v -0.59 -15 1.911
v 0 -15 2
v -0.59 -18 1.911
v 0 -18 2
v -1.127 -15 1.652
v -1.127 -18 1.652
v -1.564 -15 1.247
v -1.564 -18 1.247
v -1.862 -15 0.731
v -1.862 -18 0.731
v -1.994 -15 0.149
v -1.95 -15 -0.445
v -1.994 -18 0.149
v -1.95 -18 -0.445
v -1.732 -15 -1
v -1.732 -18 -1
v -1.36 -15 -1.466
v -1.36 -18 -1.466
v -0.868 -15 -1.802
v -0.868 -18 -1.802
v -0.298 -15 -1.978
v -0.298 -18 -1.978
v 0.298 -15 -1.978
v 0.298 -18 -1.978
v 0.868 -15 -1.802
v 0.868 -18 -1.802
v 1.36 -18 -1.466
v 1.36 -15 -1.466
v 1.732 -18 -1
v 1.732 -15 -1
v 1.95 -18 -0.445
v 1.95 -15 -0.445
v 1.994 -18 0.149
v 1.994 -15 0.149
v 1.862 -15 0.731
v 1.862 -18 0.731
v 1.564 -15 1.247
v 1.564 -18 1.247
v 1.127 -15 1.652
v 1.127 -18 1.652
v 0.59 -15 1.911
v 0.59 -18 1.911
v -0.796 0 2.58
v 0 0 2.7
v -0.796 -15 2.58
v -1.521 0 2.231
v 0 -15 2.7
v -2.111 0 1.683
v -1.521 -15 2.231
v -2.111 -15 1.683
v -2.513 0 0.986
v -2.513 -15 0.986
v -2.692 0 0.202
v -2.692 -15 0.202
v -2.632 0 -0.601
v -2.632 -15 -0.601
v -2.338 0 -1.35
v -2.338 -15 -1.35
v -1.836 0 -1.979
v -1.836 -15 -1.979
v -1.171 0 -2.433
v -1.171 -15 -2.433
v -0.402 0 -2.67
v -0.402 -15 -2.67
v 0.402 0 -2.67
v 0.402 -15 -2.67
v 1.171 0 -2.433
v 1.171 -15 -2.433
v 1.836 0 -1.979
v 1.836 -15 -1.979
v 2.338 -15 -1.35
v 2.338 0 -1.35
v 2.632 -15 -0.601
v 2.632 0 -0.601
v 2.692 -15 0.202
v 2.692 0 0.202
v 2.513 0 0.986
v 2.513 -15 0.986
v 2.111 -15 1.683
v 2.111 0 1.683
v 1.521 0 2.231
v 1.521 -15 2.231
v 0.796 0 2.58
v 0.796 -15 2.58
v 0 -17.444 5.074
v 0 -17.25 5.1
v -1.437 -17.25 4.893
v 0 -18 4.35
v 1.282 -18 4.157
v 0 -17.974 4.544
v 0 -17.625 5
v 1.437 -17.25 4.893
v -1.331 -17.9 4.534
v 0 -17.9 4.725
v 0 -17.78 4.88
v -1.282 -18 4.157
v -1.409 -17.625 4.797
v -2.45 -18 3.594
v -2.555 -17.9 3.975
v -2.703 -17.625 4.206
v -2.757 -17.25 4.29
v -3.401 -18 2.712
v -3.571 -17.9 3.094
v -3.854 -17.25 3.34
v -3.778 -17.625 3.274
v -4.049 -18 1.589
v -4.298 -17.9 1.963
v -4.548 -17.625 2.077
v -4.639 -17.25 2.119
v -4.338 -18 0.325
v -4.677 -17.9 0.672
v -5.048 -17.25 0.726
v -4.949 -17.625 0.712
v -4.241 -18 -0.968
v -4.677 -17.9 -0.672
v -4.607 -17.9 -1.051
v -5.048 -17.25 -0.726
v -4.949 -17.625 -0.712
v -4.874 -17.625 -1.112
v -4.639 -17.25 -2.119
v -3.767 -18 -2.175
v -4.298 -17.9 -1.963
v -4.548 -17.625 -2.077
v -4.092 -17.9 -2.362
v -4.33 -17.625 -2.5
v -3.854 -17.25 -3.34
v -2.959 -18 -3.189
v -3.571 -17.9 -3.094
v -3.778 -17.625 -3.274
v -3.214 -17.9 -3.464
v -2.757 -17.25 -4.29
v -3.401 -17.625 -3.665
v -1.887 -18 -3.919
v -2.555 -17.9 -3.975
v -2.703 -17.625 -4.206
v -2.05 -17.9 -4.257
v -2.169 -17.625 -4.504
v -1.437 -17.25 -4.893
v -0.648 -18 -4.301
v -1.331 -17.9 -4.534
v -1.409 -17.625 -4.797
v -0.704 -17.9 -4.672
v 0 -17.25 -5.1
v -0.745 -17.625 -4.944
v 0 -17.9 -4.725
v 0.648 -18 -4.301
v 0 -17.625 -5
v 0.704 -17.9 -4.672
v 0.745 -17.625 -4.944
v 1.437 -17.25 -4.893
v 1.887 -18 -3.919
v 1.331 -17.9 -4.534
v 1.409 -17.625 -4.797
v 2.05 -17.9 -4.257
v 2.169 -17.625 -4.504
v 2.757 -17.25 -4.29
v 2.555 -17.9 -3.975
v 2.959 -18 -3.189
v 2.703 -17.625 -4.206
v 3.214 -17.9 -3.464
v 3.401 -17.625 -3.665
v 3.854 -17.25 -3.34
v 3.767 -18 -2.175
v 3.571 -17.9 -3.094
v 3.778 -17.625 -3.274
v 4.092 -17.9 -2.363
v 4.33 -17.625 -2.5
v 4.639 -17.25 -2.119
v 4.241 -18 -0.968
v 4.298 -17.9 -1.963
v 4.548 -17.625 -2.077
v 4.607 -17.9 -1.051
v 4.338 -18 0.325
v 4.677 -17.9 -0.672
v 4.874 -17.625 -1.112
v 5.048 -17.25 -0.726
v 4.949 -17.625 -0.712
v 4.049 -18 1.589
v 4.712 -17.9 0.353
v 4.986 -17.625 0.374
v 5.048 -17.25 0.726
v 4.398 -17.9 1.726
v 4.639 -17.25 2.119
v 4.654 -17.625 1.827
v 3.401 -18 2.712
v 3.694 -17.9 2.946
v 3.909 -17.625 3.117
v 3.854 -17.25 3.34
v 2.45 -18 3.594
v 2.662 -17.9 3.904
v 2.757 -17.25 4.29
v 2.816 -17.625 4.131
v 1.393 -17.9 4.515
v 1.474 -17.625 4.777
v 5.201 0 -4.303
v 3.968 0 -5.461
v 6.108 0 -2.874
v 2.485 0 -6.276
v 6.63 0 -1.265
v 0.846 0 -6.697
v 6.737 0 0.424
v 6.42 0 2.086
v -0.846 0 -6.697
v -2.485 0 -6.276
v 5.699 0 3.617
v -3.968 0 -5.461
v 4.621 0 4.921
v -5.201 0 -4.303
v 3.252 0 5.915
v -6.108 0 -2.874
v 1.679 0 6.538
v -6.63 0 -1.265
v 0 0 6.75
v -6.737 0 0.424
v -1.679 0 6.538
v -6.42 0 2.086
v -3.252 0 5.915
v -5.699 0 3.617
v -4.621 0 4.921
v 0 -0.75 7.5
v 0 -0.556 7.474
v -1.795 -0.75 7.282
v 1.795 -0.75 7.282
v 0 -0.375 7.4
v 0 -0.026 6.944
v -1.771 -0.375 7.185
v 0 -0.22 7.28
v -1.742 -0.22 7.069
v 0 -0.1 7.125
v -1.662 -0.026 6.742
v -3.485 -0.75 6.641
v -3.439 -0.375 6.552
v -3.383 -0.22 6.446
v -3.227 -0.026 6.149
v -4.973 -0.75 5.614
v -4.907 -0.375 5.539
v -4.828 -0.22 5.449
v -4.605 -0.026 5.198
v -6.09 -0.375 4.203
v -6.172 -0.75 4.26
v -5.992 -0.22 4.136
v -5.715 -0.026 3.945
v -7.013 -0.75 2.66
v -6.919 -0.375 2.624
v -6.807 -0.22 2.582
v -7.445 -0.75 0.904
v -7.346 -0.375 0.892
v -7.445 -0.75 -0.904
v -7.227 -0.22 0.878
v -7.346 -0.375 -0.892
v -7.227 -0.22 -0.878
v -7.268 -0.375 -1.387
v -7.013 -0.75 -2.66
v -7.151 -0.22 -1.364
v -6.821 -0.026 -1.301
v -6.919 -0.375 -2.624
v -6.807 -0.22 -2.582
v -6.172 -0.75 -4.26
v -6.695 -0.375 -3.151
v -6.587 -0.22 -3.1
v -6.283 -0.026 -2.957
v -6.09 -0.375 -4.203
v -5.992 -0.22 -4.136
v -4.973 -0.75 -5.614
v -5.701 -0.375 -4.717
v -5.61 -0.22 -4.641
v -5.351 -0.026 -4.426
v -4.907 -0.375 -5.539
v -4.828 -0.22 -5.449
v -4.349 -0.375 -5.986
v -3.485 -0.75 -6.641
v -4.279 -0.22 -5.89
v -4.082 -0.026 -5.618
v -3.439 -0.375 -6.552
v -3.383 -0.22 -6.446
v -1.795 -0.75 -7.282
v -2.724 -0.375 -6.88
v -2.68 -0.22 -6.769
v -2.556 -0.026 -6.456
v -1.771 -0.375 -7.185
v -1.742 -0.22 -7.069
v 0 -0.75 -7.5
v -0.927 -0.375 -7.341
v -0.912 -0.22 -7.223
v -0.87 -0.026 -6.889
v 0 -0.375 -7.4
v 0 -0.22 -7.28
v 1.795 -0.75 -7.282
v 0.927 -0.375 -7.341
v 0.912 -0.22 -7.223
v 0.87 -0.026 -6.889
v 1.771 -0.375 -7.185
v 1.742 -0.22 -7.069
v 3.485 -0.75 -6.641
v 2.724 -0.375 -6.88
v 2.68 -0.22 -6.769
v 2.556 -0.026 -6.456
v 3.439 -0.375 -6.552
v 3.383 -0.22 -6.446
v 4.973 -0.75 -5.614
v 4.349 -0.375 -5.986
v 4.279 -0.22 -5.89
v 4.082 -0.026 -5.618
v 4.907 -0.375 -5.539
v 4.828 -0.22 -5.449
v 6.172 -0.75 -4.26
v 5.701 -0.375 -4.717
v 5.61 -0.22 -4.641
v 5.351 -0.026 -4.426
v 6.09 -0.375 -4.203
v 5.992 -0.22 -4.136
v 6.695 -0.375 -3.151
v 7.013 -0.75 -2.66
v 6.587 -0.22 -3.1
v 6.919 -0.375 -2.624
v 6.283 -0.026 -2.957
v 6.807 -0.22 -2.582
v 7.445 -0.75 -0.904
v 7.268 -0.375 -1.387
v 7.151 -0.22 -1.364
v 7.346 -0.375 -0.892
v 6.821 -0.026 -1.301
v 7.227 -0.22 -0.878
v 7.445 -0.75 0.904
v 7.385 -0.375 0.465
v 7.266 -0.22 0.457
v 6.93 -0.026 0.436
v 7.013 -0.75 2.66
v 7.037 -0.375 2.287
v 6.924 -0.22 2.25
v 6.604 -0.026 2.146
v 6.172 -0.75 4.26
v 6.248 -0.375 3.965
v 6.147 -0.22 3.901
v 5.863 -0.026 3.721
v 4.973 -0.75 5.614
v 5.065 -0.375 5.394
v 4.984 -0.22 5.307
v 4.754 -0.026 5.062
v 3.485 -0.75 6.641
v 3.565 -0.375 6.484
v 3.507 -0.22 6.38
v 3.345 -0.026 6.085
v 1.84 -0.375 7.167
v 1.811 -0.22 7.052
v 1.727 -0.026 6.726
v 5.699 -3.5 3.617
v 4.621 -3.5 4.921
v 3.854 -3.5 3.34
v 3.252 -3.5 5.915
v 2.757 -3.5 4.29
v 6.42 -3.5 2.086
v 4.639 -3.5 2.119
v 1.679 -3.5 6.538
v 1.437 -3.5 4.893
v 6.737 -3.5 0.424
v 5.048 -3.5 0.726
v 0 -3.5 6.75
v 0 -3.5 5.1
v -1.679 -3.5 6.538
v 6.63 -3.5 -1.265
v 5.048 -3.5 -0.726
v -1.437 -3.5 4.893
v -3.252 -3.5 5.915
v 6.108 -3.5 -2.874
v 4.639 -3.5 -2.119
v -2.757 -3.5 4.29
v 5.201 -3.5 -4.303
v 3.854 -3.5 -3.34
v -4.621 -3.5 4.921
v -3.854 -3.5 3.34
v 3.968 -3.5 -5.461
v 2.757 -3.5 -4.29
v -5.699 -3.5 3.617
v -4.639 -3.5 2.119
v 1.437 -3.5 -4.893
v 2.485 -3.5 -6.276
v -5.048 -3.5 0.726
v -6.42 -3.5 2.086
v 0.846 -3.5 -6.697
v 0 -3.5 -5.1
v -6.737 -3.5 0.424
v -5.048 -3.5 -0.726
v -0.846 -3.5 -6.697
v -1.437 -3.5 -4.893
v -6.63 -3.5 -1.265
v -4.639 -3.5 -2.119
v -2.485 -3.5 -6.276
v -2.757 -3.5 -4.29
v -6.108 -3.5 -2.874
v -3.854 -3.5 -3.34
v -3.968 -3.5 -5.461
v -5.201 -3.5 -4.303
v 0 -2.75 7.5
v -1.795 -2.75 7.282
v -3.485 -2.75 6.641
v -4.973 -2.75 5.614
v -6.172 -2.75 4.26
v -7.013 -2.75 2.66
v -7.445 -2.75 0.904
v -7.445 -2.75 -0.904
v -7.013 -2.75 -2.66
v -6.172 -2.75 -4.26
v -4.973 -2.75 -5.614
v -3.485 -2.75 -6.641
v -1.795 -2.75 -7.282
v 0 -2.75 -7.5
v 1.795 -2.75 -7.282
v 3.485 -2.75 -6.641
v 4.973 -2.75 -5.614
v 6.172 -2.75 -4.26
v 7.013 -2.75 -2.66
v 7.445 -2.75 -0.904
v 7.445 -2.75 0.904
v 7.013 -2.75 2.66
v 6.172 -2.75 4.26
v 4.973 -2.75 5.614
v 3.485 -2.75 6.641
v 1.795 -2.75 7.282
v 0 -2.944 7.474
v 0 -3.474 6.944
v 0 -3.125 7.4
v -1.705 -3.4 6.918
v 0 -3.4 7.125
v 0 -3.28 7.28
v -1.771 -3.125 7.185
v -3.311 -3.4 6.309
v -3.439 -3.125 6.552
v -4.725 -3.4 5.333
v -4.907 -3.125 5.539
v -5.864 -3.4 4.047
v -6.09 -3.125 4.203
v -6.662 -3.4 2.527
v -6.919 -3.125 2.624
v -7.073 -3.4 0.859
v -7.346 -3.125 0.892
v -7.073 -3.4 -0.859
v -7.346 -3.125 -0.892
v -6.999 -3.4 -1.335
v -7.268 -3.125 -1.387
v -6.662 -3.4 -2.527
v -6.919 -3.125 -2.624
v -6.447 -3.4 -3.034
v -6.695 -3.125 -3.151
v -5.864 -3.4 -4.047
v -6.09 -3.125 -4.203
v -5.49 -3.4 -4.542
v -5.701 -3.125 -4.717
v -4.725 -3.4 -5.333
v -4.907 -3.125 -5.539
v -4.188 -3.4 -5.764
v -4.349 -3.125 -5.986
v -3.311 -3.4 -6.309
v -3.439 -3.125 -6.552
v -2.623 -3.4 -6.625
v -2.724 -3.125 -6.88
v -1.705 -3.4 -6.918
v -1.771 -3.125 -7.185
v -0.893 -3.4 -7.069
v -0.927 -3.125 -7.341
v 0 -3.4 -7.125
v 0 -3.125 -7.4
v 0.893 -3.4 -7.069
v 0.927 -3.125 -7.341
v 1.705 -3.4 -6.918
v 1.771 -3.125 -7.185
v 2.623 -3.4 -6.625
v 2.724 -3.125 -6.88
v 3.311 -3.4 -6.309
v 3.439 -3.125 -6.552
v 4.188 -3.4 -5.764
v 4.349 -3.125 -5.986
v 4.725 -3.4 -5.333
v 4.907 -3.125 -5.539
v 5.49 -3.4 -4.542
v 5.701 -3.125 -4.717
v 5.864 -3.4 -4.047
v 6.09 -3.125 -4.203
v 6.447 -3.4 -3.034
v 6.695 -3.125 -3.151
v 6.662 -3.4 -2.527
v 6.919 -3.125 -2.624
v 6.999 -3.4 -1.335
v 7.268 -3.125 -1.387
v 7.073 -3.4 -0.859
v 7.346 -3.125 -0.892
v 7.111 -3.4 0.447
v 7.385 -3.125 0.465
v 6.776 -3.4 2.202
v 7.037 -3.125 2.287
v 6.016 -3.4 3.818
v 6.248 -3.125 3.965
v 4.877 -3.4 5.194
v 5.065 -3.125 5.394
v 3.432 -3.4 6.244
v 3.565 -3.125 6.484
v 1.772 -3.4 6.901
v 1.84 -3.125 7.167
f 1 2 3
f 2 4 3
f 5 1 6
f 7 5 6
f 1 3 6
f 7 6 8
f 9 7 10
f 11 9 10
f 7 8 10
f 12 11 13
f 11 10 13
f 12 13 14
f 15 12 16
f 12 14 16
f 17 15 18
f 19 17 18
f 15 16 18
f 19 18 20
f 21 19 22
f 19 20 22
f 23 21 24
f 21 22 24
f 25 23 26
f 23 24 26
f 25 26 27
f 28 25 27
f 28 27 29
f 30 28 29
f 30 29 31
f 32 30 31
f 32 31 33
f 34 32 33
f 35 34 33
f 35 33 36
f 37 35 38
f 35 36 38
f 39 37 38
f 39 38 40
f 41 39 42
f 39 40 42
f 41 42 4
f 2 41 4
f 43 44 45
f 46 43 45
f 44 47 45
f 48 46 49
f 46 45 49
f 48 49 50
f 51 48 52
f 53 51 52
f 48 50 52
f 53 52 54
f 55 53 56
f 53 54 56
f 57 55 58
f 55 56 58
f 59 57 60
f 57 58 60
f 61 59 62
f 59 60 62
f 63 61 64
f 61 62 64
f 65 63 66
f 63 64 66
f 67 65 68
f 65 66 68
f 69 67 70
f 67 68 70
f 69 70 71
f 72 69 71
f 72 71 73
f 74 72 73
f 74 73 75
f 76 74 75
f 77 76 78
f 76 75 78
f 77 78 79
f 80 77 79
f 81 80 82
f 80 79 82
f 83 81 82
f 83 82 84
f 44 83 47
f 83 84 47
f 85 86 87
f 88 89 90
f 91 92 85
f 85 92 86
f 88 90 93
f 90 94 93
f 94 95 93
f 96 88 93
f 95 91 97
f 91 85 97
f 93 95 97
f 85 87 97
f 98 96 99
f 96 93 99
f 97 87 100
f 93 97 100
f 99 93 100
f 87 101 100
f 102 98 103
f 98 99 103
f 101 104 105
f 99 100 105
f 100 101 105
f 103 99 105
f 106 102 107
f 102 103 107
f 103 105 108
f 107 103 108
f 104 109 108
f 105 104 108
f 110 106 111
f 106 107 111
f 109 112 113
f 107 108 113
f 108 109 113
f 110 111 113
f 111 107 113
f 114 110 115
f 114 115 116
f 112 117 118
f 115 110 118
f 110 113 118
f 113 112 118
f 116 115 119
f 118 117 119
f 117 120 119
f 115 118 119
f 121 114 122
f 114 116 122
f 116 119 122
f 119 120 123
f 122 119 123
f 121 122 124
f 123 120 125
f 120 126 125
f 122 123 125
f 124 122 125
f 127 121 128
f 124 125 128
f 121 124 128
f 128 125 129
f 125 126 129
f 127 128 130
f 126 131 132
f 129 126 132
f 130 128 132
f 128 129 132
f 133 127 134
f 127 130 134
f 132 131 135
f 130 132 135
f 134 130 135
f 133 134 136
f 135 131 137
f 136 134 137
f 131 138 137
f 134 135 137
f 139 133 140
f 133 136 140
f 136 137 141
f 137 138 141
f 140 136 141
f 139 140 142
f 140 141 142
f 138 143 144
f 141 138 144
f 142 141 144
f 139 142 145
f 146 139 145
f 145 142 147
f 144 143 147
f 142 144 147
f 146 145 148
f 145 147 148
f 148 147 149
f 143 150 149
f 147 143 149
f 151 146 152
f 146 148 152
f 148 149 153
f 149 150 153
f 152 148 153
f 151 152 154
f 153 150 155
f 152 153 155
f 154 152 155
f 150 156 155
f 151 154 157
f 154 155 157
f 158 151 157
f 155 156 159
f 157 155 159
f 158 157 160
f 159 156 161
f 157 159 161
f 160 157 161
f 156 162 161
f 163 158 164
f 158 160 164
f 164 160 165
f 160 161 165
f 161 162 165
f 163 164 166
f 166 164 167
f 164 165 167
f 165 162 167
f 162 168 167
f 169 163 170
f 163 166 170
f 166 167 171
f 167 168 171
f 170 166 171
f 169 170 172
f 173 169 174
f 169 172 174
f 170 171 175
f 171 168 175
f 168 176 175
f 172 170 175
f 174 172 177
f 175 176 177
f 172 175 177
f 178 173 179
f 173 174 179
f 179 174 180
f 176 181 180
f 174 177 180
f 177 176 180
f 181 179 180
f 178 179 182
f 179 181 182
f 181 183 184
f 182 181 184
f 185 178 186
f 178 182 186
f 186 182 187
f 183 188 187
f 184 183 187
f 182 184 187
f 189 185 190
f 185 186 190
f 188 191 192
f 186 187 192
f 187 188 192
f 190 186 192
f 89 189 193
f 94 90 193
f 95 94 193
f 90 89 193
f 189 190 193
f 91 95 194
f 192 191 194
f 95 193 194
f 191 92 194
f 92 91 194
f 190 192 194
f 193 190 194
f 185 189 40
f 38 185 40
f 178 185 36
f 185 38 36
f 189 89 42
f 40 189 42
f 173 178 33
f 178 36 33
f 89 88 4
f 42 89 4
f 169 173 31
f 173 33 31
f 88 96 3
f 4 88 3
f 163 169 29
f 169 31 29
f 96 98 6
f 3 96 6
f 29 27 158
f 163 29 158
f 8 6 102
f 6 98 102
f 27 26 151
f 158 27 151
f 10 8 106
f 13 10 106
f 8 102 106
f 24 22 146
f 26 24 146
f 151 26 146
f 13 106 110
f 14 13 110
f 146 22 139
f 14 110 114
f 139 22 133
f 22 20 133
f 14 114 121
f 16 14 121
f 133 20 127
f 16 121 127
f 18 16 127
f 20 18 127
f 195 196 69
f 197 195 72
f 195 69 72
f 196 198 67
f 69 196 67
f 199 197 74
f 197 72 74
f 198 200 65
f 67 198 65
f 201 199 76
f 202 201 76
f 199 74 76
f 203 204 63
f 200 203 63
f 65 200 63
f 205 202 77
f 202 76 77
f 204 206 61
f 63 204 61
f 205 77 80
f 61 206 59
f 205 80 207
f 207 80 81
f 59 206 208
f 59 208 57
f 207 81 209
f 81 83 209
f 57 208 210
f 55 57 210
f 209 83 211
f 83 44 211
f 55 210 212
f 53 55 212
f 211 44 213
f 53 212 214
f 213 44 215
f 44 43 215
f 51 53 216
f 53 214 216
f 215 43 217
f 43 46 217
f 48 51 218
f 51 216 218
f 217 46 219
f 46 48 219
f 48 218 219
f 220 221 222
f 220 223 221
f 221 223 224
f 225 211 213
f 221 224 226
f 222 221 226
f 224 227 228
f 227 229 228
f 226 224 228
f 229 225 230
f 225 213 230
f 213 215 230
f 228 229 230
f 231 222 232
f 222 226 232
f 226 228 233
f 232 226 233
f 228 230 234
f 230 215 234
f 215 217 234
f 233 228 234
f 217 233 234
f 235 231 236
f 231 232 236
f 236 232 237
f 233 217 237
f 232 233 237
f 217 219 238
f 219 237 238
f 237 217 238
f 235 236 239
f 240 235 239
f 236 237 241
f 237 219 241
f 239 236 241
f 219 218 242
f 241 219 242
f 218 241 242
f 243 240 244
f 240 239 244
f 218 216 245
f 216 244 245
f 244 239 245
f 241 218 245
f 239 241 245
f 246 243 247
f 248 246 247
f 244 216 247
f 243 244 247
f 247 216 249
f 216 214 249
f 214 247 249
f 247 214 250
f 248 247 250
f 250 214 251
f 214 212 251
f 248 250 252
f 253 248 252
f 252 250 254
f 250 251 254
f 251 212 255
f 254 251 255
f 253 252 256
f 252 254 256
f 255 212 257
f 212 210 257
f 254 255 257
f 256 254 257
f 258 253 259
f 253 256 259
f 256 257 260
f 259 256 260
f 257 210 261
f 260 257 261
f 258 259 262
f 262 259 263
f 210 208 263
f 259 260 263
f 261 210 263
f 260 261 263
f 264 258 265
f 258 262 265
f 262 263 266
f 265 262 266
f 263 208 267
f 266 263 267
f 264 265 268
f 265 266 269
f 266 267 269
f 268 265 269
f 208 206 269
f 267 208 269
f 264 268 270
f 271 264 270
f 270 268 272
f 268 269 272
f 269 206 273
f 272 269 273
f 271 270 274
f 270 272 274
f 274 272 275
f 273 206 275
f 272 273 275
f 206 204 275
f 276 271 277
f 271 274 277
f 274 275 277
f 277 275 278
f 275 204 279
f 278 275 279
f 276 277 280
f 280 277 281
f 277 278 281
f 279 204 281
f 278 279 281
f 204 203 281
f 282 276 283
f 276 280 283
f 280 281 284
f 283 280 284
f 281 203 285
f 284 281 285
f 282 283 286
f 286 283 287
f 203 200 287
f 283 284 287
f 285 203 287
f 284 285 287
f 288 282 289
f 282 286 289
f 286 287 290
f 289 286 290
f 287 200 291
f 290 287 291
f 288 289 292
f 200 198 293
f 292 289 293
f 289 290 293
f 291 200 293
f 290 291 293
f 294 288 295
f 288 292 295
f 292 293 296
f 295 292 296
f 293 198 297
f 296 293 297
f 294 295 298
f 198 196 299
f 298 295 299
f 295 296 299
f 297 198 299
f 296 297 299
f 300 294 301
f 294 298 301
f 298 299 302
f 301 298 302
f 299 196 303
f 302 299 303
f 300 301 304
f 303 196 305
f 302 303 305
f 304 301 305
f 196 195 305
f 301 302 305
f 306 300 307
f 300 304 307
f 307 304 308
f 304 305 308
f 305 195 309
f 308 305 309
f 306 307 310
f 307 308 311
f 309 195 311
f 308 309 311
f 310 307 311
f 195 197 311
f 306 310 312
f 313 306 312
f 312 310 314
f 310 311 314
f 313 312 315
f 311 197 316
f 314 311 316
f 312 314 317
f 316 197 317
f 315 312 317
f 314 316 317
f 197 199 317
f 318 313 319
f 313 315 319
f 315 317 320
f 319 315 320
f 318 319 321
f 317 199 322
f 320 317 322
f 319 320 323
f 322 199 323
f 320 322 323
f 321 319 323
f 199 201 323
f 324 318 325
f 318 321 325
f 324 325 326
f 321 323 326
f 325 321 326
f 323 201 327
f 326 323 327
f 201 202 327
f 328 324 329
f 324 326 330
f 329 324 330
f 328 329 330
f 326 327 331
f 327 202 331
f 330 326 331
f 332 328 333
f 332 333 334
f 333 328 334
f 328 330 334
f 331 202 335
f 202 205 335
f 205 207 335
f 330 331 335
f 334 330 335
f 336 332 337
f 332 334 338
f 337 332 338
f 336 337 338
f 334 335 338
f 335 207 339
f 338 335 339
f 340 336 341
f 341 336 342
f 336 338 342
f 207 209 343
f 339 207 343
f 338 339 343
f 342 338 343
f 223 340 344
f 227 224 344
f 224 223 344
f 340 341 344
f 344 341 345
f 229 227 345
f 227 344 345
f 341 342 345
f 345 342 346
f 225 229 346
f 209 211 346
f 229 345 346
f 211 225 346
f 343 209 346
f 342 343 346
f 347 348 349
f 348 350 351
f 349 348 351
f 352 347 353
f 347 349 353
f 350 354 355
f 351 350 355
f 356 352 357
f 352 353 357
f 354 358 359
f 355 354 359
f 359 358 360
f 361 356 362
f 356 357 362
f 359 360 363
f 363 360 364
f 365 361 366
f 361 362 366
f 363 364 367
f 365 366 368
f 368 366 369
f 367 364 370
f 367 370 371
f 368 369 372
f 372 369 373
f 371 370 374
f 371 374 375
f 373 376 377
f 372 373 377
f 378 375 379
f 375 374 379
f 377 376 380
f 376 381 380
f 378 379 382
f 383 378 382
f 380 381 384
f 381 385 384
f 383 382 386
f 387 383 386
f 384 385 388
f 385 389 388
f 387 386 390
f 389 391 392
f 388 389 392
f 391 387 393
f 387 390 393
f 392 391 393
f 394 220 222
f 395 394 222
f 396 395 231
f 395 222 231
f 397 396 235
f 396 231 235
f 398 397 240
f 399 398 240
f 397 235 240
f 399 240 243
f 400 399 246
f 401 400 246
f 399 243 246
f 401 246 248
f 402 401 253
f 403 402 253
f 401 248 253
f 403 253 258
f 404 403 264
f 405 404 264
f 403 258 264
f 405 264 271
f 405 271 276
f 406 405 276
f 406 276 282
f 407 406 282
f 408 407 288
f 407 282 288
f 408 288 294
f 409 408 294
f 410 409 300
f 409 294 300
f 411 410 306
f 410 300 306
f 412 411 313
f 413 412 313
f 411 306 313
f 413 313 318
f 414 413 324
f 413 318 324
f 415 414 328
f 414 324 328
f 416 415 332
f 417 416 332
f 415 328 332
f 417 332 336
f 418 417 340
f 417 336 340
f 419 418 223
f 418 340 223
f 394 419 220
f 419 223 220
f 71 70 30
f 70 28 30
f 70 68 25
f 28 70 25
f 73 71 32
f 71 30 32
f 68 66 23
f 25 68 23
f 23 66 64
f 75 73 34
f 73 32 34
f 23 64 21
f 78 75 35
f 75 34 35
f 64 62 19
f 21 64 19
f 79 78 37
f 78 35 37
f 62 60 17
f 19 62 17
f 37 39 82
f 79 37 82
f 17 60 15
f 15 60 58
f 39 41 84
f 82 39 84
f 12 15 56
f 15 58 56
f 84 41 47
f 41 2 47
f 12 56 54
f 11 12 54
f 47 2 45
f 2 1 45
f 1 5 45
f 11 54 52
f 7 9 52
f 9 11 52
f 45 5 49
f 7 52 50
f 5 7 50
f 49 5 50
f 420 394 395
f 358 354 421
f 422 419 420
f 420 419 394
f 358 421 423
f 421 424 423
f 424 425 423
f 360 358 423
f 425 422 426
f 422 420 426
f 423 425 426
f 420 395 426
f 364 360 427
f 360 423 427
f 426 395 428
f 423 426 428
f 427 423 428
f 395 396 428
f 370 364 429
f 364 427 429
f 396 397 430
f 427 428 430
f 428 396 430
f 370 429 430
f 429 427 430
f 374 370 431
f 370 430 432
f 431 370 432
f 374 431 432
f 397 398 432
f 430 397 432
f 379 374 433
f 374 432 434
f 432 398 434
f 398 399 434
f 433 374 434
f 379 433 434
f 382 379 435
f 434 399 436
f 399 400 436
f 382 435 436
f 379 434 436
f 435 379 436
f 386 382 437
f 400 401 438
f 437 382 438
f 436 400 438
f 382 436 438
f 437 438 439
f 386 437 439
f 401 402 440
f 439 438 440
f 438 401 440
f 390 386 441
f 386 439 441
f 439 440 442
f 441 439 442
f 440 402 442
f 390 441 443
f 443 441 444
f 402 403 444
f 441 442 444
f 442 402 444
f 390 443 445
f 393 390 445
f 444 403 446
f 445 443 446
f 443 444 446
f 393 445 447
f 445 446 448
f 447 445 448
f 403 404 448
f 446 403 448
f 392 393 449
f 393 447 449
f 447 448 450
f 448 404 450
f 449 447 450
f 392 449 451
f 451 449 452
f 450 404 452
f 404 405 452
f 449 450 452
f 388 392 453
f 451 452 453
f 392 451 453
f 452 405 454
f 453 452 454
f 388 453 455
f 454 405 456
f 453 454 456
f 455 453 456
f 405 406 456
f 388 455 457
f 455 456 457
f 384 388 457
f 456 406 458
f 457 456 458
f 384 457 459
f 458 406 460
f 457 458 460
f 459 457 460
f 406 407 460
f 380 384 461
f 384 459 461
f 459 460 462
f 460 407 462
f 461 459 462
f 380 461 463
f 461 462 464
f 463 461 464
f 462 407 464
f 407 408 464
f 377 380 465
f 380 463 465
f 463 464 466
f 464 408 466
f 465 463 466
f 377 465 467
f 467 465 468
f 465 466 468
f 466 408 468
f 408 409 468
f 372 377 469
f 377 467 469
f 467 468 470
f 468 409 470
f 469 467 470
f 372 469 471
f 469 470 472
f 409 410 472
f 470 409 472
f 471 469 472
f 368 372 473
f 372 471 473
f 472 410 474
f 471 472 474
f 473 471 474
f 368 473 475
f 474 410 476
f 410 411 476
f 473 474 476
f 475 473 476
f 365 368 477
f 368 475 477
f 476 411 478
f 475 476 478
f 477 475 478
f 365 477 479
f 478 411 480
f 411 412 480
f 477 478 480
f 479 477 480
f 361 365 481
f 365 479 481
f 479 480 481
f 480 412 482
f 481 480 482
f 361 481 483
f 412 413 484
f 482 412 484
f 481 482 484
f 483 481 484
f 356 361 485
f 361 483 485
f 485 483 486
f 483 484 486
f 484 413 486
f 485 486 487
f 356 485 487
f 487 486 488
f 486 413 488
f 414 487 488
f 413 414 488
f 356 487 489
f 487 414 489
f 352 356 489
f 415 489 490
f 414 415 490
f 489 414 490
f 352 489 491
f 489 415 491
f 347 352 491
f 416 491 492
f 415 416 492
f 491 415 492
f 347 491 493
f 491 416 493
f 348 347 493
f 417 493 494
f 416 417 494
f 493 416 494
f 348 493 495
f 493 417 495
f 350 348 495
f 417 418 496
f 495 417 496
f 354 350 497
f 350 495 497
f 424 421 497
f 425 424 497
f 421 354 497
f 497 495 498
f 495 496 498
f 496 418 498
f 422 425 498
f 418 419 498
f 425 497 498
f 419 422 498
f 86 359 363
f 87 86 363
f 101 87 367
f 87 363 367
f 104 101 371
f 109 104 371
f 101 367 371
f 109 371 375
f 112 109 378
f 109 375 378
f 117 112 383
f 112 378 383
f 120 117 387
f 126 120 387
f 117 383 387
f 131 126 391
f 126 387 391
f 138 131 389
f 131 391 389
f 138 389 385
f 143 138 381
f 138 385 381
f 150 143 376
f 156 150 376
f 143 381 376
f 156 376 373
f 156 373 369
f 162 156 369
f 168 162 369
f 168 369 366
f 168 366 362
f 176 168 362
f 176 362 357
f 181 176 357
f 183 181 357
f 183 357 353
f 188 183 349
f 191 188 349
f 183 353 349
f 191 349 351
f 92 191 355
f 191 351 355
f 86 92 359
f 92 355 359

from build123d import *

# Parameters (mm, degrees)
FILLET1_R = 0.75


with BuildPart() as part:
    # Sketch1 → Revolve1 (revolve)
    with BuildSketch(Plane(origin=(0, 0, 0), x_dir=(0, 0, -1), z_dir=(1, 0, 0)), mode=Mode.PRIVATE) as revolve1_sk:
        Polygon((2.7, 0), (2.7, -15), (2, -15), (2, -18), (5.1, -18), (5.1, -3.5), (7.5, -3.5), (7.5, 0), align=None)
    revolve(revolve1_sk.sketch.rotate(Axis((0, 0, 0), (0, -1, 0)), 180), axis=Axis((0, 0, 0), (0, -1, 0)))

    # Fillet1
    fillet1_edges = [part.edges().sort_by_distance(p)[0] for p in [
        (0, 0, -7.5),
        (0, -3.5, -7.5),
        (0, -18, -5.1),
    ]]
    fillet(fillet1_edges, radius=FILLET1_R)


solid = part.part
